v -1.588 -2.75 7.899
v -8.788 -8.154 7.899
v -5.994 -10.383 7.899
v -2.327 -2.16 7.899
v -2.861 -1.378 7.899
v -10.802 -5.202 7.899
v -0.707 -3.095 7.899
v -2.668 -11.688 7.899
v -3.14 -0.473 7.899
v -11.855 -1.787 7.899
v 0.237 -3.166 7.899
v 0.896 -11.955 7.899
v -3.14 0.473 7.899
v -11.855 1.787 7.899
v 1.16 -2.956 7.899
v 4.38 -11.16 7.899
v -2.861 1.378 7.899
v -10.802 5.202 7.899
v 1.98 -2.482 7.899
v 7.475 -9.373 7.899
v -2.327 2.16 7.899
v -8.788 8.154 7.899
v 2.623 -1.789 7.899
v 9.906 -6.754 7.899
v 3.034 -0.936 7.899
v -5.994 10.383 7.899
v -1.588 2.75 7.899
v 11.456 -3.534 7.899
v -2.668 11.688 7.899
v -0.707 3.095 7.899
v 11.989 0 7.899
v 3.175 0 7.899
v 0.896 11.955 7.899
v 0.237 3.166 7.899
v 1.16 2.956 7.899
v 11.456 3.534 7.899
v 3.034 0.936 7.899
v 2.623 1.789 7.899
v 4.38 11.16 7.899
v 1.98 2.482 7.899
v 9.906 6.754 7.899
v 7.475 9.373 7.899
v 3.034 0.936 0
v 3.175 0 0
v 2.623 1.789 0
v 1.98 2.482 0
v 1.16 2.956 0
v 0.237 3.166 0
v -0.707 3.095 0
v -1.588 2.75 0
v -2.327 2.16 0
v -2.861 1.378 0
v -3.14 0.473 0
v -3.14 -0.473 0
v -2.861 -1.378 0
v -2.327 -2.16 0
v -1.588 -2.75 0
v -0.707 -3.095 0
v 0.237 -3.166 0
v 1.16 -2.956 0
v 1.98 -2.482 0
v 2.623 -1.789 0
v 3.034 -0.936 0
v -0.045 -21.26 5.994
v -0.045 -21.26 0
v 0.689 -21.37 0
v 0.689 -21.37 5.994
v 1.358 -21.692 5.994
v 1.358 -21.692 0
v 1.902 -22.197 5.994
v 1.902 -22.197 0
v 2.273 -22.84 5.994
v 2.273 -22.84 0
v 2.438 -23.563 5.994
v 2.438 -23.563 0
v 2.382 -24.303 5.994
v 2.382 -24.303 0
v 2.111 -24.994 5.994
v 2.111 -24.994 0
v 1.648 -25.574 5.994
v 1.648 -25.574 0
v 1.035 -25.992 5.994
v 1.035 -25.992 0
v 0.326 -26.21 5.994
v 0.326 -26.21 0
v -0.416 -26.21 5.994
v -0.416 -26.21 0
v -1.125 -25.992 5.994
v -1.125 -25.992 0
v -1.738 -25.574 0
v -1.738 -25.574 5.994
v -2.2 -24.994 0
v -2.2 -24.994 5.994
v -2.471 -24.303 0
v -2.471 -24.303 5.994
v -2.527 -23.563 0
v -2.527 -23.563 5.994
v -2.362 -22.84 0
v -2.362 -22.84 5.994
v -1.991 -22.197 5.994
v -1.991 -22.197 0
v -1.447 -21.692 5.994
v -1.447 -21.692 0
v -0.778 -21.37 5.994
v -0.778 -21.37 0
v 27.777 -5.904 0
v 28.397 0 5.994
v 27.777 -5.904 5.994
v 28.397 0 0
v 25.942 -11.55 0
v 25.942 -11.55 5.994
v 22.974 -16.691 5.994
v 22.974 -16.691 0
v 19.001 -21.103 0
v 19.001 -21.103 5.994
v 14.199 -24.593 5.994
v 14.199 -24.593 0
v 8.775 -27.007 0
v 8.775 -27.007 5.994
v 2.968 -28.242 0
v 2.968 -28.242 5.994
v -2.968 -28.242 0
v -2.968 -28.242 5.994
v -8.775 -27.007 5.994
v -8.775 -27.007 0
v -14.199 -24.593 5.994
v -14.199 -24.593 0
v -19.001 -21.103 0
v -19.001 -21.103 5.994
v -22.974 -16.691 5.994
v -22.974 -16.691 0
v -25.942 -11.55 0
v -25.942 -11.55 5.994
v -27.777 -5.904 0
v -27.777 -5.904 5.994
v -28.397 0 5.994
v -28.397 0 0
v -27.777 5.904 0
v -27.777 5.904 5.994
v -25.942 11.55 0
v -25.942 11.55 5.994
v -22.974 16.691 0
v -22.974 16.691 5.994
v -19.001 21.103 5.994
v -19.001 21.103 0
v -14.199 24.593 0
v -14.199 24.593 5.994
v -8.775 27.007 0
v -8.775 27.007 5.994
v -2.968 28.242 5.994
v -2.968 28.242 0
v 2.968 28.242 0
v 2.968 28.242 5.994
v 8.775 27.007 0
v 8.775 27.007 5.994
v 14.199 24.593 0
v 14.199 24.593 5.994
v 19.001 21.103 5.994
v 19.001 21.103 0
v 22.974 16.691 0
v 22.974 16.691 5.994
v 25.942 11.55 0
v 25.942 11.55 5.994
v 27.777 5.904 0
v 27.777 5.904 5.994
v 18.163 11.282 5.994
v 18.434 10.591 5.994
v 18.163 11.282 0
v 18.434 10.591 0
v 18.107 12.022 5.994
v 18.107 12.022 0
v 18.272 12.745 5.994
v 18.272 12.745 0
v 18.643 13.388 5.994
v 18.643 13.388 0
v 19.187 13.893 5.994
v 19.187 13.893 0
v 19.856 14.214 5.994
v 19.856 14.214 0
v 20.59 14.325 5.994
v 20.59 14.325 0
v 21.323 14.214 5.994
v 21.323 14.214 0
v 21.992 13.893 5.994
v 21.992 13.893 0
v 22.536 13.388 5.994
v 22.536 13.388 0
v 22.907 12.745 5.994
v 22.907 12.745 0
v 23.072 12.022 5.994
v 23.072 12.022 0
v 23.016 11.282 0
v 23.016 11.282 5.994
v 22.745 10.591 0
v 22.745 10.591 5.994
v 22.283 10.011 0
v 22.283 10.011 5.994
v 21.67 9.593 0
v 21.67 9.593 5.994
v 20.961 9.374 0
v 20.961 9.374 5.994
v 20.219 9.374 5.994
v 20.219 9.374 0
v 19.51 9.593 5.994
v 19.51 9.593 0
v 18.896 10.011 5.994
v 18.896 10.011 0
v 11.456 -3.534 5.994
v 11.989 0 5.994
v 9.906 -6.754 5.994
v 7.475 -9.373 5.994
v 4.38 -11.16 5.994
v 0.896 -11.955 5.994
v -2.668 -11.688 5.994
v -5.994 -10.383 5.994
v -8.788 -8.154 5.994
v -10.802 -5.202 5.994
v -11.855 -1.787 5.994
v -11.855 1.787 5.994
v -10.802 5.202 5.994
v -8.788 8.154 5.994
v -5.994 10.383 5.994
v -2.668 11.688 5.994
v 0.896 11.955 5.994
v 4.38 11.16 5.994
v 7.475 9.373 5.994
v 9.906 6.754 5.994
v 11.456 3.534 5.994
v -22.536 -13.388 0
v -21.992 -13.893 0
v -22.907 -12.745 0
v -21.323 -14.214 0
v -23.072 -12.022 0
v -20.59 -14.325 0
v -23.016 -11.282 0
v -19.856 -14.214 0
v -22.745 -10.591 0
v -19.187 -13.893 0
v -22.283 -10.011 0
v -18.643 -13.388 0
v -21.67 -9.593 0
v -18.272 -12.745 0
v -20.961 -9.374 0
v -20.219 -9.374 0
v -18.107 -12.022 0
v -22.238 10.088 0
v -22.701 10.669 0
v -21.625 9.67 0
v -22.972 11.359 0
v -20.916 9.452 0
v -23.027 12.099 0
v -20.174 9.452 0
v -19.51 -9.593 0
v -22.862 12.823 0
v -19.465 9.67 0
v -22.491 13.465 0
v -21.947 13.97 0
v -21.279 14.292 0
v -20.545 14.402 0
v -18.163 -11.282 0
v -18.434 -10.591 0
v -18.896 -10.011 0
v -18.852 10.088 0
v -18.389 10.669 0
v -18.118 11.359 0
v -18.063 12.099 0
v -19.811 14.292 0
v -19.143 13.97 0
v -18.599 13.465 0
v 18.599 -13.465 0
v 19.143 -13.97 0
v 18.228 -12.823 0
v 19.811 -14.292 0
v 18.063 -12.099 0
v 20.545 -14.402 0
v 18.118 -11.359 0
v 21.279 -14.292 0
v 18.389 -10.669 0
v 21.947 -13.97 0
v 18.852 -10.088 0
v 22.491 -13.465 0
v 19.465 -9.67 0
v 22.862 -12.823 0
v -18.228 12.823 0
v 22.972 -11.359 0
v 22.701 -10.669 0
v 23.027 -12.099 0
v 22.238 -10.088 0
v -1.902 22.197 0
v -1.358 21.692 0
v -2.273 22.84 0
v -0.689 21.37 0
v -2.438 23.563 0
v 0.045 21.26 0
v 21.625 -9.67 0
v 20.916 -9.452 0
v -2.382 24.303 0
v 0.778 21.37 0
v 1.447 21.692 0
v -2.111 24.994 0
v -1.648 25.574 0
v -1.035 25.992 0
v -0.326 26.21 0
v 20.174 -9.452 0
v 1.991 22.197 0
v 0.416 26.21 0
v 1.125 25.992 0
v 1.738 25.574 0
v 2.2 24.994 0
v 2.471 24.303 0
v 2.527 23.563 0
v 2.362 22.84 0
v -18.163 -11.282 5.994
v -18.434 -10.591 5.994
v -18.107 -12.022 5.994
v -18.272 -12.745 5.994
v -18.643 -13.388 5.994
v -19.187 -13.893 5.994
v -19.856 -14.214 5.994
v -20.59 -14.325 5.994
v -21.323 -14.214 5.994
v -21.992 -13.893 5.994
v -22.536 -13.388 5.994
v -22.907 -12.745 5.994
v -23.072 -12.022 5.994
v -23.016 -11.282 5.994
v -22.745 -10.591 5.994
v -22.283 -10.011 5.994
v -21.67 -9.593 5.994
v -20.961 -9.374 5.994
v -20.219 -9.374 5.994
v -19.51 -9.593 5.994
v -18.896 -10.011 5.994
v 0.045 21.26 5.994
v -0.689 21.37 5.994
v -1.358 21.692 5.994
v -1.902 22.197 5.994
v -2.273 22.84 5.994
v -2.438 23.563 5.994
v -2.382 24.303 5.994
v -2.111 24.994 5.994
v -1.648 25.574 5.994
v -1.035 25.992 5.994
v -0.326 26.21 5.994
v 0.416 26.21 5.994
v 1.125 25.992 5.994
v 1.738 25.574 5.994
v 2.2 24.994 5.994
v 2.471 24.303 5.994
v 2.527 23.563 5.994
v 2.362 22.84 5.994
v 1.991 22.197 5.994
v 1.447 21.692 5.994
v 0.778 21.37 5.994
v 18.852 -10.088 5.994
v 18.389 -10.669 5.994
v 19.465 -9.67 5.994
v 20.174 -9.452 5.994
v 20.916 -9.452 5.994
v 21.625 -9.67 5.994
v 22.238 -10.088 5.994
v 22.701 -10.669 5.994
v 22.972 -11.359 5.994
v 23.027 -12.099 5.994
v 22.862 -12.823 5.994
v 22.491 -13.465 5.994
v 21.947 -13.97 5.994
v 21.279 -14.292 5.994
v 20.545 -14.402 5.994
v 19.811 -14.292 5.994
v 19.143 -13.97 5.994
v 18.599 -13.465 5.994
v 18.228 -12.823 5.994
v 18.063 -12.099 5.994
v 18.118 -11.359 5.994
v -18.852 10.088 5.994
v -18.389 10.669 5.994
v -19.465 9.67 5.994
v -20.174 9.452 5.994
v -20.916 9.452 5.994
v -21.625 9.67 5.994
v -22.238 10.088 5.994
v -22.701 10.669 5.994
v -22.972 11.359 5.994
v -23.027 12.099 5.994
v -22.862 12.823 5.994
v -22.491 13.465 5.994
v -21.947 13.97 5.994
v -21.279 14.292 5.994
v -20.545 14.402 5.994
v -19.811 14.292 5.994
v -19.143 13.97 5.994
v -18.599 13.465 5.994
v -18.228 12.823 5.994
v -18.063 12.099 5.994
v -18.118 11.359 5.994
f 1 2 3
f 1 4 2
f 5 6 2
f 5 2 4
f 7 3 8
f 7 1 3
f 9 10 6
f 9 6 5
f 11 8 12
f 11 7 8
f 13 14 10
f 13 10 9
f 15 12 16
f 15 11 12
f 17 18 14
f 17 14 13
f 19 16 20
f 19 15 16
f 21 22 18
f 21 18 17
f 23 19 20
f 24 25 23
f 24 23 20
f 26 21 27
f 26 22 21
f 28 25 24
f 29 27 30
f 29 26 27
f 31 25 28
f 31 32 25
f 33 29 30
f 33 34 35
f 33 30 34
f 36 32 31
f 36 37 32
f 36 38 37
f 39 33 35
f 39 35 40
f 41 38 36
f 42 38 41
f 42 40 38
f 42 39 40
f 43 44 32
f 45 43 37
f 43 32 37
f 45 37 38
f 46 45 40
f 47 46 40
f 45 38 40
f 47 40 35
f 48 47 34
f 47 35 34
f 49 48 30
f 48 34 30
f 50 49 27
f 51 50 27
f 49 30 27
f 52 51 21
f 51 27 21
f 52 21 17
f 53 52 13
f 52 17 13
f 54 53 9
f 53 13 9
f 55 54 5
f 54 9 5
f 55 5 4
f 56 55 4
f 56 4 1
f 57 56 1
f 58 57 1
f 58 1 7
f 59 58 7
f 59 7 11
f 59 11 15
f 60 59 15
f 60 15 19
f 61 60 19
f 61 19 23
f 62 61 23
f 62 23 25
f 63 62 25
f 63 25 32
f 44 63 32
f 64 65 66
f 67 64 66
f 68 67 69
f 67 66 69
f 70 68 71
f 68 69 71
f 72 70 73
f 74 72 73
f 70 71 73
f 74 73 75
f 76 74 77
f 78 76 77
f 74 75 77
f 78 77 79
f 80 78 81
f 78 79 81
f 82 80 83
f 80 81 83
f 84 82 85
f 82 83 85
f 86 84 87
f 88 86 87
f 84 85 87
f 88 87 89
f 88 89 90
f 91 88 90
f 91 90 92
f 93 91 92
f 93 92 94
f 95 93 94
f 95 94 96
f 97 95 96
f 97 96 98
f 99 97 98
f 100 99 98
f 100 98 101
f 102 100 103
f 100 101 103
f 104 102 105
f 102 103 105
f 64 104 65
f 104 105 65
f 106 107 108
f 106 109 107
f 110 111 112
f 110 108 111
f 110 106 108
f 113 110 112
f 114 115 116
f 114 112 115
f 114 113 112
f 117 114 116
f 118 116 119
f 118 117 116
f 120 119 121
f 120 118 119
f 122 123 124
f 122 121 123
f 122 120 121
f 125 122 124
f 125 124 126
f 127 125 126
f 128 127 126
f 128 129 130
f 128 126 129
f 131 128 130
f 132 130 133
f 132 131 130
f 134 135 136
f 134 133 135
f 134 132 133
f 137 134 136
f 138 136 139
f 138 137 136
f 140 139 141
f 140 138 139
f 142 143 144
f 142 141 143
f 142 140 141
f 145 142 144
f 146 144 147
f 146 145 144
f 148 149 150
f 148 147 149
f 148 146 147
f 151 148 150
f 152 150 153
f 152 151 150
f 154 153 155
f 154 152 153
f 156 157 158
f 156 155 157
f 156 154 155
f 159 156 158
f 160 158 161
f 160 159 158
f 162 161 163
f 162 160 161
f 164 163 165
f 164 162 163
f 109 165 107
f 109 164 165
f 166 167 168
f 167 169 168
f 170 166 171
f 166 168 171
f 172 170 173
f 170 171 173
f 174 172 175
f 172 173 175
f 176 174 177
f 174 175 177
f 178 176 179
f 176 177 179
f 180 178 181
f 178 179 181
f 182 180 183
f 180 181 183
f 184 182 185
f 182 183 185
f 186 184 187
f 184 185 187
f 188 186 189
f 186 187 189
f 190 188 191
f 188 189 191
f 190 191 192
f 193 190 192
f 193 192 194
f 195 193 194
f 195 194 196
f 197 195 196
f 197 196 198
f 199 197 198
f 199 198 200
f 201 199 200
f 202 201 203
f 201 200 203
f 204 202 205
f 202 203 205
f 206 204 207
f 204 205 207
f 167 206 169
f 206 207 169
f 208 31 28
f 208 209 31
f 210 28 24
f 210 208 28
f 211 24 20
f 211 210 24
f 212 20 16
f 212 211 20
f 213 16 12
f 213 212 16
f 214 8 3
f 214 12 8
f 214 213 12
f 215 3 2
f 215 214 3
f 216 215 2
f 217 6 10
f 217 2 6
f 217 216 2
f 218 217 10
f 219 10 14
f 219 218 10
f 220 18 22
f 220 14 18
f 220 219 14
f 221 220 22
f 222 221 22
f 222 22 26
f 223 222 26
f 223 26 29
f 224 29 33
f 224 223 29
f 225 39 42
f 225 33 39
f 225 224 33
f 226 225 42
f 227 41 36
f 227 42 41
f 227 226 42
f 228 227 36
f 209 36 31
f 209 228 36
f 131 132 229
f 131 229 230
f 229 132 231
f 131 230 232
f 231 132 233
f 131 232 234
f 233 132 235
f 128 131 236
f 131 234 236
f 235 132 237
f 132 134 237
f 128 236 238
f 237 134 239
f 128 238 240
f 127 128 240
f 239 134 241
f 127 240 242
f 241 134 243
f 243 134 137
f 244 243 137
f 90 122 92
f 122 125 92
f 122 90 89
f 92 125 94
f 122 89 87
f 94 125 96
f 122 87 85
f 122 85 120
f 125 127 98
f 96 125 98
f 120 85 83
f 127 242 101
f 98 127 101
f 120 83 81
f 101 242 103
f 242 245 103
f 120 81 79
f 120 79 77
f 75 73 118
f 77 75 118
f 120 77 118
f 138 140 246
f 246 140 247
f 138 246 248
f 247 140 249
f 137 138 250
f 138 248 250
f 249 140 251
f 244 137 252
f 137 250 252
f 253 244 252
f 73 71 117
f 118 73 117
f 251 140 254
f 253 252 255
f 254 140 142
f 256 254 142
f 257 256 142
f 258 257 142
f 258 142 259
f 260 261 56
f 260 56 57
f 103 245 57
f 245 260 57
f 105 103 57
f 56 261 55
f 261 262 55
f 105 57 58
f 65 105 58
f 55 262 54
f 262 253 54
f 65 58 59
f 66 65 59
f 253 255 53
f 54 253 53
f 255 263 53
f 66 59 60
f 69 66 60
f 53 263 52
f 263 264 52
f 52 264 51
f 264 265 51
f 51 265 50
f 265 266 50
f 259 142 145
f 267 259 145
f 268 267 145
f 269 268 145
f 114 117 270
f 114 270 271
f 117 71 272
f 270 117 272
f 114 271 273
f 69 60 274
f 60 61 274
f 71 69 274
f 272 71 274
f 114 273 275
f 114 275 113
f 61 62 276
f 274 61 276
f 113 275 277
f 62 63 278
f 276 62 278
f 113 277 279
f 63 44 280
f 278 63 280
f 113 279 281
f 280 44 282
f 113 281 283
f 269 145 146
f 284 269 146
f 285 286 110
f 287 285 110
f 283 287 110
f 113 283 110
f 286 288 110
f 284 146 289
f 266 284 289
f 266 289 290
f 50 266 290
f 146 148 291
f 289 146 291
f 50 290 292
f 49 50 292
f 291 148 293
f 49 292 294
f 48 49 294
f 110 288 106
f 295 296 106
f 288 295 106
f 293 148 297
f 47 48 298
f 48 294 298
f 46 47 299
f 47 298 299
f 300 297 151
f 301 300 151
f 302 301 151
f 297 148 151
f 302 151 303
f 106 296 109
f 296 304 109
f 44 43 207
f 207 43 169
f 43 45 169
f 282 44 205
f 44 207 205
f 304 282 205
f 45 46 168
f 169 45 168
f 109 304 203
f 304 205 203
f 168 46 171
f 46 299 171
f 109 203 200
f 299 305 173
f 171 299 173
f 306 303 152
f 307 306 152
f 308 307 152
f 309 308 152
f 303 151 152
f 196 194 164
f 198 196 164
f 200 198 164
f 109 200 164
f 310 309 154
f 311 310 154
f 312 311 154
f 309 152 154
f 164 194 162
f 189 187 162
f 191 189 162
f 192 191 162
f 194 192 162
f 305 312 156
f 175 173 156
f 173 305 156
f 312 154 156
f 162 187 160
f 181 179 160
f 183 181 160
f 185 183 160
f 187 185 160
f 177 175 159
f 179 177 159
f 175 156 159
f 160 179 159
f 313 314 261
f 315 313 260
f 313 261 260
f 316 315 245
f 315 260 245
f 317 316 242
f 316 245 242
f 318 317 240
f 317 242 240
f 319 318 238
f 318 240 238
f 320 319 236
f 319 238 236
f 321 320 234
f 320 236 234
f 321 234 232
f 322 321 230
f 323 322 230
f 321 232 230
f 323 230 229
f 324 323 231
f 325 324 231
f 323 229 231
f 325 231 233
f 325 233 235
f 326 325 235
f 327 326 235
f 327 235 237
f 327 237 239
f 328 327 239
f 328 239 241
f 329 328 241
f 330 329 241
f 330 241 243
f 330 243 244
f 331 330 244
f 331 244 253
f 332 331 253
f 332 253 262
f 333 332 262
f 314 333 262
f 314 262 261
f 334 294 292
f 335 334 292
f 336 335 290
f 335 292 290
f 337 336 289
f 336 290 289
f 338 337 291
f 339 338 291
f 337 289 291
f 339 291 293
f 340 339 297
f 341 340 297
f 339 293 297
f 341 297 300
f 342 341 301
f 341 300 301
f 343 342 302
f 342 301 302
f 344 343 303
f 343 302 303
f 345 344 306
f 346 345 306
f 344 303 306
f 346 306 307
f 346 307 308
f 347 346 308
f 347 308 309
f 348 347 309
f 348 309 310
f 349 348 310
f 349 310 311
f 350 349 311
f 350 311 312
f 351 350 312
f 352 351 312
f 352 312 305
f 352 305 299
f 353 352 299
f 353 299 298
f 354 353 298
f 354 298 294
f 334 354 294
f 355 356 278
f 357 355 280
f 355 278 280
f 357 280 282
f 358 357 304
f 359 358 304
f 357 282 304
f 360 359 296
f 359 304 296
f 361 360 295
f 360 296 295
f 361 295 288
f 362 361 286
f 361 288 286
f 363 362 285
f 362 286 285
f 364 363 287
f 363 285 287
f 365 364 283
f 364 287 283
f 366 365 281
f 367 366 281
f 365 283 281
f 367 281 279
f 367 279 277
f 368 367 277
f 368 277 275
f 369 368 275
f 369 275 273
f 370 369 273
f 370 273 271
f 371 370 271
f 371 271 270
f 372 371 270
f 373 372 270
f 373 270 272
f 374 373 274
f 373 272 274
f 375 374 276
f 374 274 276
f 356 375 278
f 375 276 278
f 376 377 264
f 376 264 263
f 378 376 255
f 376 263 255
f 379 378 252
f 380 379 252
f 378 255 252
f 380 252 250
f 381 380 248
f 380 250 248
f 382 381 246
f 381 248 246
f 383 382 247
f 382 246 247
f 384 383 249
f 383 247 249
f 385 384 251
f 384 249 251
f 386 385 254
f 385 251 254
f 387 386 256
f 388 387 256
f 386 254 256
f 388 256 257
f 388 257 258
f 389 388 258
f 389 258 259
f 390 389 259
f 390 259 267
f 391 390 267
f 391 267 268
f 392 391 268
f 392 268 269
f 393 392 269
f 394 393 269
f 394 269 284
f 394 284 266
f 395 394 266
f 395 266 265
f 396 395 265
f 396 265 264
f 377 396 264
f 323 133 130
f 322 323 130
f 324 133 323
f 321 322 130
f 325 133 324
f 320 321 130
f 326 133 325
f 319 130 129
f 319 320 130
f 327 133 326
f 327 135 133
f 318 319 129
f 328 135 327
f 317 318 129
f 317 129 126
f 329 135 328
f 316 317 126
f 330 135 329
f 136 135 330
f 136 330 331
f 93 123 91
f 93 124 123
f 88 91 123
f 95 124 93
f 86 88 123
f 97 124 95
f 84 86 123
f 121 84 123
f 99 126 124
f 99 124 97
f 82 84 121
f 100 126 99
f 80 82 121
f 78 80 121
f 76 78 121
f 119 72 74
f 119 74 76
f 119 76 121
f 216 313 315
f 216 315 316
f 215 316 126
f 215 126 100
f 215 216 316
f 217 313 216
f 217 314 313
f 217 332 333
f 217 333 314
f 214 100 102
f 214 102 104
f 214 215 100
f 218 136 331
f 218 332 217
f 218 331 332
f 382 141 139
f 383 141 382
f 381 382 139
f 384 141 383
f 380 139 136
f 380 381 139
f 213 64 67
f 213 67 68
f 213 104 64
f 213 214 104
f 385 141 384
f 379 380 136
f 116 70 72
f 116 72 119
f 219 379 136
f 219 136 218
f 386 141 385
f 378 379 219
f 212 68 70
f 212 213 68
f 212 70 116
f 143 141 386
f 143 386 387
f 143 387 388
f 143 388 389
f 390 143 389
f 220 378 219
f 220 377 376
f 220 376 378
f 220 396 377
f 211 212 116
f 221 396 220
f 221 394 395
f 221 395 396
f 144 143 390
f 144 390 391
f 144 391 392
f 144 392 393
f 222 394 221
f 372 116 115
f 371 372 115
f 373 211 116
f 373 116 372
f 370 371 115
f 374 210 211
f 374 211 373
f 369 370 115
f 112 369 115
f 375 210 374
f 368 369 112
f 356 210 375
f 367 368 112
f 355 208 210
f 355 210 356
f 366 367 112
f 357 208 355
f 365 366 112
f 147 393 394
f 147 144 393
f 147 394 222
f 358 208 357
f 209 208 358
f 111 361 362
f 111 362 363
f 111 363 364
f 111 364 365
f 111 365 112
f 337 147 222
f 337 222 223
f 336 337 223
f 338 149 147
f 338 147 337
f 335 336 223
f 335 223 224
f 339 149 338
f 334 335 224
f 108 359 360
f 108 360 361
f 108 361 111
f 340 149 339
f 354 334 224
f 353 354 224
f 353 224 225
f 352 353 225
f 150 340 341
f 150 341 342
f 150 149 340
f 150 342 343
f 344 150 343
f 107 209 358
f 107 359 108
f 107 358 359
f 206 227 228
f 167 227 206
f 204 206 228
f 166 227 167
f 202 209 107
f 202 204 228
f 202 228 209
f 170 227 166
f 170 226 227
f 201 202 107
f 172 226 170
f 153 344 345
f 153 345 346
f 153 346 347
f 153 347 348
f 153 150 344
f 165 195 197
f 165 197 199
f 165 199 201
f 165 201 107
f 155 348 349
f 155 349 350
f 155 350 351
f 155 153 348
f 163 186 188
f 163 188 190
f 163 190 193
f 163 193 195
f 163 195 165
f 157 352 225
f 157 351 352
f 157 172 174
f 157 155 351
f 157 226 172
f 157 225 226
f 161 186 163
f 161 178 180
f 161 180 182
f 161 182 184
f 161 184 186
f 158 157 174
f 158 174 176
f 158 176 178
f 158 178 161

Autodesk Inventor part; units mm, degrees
ref_plane "YZ Plane" through (0, 0, 0) normal (1, 0, 0) x (0, 1, 0)
ref_plane "XZ Plane" through (0, 0, 0) normal (0, 1, 0) x (-1, 0, 0)
ref_plane "XY Plane" through (0, 0, 0) normal (0, 0, 1) x (1, 0, 0)
sketch "Sketch1" plane through (0, 0, 0) normal (0, 0, 1) x (1, 0, 0)
  circle A0 centre (0, 0) radius 28.3972
  dimension "d0" = 56.7944
extrude "Extrusion1" add sketch "Sketch1" along normal blind 5.9944
sketch "Sketch2" plane through (0, 0, 5.9944) normal (0, 0, 1) x (1, 0, 0)
  circle A0 centre (0, 0) radius 11.9888
  dimension "d3" = 23.9776
extrude "Extrusion2" add sketch "Sketch2" along normal blind 1.905
sketch "Sketch3" plane through (0, 0, 7.8994) normal (0, 0, 1) x (1, 0, 0)
  circle A0 centre (0, 0) radius 3.175
  dimension "d6" = 6.35
extrude "Extrusion3" cut sketch "Sketch3" against normal blind 25.4
sketch "Sketch4" plane through (0, 0, 5.9944) normal (0, 0, 1) x (1, 0, 0)
  circle A0 centre (0, 0) radius 28.3972 projected
  circle A1 centre (0, 0) radius 11.9888 projected
  circle A2 centre (0, 0) radius 28.3972 projected
  circle A3 centre (0, 0) radius 28.3972 projected
  point P0 (0.0446, 23.749)
hole "Hole1" at (0.0446, 23.749, 5.9944) direction (0, 0, -1) diameter 4.9784 depth 19.05 tip angle 118 thread size "1/4-20 UNC" class "2B" standard "ANSI Unified Screw Threads"
pattern_circular "Circular Pattern1" count 6 over 360 about axis through (0, 0, 7.8994) along (0, 0, -1) of "Hole1"
properties part number "nexus adapter plate final"
